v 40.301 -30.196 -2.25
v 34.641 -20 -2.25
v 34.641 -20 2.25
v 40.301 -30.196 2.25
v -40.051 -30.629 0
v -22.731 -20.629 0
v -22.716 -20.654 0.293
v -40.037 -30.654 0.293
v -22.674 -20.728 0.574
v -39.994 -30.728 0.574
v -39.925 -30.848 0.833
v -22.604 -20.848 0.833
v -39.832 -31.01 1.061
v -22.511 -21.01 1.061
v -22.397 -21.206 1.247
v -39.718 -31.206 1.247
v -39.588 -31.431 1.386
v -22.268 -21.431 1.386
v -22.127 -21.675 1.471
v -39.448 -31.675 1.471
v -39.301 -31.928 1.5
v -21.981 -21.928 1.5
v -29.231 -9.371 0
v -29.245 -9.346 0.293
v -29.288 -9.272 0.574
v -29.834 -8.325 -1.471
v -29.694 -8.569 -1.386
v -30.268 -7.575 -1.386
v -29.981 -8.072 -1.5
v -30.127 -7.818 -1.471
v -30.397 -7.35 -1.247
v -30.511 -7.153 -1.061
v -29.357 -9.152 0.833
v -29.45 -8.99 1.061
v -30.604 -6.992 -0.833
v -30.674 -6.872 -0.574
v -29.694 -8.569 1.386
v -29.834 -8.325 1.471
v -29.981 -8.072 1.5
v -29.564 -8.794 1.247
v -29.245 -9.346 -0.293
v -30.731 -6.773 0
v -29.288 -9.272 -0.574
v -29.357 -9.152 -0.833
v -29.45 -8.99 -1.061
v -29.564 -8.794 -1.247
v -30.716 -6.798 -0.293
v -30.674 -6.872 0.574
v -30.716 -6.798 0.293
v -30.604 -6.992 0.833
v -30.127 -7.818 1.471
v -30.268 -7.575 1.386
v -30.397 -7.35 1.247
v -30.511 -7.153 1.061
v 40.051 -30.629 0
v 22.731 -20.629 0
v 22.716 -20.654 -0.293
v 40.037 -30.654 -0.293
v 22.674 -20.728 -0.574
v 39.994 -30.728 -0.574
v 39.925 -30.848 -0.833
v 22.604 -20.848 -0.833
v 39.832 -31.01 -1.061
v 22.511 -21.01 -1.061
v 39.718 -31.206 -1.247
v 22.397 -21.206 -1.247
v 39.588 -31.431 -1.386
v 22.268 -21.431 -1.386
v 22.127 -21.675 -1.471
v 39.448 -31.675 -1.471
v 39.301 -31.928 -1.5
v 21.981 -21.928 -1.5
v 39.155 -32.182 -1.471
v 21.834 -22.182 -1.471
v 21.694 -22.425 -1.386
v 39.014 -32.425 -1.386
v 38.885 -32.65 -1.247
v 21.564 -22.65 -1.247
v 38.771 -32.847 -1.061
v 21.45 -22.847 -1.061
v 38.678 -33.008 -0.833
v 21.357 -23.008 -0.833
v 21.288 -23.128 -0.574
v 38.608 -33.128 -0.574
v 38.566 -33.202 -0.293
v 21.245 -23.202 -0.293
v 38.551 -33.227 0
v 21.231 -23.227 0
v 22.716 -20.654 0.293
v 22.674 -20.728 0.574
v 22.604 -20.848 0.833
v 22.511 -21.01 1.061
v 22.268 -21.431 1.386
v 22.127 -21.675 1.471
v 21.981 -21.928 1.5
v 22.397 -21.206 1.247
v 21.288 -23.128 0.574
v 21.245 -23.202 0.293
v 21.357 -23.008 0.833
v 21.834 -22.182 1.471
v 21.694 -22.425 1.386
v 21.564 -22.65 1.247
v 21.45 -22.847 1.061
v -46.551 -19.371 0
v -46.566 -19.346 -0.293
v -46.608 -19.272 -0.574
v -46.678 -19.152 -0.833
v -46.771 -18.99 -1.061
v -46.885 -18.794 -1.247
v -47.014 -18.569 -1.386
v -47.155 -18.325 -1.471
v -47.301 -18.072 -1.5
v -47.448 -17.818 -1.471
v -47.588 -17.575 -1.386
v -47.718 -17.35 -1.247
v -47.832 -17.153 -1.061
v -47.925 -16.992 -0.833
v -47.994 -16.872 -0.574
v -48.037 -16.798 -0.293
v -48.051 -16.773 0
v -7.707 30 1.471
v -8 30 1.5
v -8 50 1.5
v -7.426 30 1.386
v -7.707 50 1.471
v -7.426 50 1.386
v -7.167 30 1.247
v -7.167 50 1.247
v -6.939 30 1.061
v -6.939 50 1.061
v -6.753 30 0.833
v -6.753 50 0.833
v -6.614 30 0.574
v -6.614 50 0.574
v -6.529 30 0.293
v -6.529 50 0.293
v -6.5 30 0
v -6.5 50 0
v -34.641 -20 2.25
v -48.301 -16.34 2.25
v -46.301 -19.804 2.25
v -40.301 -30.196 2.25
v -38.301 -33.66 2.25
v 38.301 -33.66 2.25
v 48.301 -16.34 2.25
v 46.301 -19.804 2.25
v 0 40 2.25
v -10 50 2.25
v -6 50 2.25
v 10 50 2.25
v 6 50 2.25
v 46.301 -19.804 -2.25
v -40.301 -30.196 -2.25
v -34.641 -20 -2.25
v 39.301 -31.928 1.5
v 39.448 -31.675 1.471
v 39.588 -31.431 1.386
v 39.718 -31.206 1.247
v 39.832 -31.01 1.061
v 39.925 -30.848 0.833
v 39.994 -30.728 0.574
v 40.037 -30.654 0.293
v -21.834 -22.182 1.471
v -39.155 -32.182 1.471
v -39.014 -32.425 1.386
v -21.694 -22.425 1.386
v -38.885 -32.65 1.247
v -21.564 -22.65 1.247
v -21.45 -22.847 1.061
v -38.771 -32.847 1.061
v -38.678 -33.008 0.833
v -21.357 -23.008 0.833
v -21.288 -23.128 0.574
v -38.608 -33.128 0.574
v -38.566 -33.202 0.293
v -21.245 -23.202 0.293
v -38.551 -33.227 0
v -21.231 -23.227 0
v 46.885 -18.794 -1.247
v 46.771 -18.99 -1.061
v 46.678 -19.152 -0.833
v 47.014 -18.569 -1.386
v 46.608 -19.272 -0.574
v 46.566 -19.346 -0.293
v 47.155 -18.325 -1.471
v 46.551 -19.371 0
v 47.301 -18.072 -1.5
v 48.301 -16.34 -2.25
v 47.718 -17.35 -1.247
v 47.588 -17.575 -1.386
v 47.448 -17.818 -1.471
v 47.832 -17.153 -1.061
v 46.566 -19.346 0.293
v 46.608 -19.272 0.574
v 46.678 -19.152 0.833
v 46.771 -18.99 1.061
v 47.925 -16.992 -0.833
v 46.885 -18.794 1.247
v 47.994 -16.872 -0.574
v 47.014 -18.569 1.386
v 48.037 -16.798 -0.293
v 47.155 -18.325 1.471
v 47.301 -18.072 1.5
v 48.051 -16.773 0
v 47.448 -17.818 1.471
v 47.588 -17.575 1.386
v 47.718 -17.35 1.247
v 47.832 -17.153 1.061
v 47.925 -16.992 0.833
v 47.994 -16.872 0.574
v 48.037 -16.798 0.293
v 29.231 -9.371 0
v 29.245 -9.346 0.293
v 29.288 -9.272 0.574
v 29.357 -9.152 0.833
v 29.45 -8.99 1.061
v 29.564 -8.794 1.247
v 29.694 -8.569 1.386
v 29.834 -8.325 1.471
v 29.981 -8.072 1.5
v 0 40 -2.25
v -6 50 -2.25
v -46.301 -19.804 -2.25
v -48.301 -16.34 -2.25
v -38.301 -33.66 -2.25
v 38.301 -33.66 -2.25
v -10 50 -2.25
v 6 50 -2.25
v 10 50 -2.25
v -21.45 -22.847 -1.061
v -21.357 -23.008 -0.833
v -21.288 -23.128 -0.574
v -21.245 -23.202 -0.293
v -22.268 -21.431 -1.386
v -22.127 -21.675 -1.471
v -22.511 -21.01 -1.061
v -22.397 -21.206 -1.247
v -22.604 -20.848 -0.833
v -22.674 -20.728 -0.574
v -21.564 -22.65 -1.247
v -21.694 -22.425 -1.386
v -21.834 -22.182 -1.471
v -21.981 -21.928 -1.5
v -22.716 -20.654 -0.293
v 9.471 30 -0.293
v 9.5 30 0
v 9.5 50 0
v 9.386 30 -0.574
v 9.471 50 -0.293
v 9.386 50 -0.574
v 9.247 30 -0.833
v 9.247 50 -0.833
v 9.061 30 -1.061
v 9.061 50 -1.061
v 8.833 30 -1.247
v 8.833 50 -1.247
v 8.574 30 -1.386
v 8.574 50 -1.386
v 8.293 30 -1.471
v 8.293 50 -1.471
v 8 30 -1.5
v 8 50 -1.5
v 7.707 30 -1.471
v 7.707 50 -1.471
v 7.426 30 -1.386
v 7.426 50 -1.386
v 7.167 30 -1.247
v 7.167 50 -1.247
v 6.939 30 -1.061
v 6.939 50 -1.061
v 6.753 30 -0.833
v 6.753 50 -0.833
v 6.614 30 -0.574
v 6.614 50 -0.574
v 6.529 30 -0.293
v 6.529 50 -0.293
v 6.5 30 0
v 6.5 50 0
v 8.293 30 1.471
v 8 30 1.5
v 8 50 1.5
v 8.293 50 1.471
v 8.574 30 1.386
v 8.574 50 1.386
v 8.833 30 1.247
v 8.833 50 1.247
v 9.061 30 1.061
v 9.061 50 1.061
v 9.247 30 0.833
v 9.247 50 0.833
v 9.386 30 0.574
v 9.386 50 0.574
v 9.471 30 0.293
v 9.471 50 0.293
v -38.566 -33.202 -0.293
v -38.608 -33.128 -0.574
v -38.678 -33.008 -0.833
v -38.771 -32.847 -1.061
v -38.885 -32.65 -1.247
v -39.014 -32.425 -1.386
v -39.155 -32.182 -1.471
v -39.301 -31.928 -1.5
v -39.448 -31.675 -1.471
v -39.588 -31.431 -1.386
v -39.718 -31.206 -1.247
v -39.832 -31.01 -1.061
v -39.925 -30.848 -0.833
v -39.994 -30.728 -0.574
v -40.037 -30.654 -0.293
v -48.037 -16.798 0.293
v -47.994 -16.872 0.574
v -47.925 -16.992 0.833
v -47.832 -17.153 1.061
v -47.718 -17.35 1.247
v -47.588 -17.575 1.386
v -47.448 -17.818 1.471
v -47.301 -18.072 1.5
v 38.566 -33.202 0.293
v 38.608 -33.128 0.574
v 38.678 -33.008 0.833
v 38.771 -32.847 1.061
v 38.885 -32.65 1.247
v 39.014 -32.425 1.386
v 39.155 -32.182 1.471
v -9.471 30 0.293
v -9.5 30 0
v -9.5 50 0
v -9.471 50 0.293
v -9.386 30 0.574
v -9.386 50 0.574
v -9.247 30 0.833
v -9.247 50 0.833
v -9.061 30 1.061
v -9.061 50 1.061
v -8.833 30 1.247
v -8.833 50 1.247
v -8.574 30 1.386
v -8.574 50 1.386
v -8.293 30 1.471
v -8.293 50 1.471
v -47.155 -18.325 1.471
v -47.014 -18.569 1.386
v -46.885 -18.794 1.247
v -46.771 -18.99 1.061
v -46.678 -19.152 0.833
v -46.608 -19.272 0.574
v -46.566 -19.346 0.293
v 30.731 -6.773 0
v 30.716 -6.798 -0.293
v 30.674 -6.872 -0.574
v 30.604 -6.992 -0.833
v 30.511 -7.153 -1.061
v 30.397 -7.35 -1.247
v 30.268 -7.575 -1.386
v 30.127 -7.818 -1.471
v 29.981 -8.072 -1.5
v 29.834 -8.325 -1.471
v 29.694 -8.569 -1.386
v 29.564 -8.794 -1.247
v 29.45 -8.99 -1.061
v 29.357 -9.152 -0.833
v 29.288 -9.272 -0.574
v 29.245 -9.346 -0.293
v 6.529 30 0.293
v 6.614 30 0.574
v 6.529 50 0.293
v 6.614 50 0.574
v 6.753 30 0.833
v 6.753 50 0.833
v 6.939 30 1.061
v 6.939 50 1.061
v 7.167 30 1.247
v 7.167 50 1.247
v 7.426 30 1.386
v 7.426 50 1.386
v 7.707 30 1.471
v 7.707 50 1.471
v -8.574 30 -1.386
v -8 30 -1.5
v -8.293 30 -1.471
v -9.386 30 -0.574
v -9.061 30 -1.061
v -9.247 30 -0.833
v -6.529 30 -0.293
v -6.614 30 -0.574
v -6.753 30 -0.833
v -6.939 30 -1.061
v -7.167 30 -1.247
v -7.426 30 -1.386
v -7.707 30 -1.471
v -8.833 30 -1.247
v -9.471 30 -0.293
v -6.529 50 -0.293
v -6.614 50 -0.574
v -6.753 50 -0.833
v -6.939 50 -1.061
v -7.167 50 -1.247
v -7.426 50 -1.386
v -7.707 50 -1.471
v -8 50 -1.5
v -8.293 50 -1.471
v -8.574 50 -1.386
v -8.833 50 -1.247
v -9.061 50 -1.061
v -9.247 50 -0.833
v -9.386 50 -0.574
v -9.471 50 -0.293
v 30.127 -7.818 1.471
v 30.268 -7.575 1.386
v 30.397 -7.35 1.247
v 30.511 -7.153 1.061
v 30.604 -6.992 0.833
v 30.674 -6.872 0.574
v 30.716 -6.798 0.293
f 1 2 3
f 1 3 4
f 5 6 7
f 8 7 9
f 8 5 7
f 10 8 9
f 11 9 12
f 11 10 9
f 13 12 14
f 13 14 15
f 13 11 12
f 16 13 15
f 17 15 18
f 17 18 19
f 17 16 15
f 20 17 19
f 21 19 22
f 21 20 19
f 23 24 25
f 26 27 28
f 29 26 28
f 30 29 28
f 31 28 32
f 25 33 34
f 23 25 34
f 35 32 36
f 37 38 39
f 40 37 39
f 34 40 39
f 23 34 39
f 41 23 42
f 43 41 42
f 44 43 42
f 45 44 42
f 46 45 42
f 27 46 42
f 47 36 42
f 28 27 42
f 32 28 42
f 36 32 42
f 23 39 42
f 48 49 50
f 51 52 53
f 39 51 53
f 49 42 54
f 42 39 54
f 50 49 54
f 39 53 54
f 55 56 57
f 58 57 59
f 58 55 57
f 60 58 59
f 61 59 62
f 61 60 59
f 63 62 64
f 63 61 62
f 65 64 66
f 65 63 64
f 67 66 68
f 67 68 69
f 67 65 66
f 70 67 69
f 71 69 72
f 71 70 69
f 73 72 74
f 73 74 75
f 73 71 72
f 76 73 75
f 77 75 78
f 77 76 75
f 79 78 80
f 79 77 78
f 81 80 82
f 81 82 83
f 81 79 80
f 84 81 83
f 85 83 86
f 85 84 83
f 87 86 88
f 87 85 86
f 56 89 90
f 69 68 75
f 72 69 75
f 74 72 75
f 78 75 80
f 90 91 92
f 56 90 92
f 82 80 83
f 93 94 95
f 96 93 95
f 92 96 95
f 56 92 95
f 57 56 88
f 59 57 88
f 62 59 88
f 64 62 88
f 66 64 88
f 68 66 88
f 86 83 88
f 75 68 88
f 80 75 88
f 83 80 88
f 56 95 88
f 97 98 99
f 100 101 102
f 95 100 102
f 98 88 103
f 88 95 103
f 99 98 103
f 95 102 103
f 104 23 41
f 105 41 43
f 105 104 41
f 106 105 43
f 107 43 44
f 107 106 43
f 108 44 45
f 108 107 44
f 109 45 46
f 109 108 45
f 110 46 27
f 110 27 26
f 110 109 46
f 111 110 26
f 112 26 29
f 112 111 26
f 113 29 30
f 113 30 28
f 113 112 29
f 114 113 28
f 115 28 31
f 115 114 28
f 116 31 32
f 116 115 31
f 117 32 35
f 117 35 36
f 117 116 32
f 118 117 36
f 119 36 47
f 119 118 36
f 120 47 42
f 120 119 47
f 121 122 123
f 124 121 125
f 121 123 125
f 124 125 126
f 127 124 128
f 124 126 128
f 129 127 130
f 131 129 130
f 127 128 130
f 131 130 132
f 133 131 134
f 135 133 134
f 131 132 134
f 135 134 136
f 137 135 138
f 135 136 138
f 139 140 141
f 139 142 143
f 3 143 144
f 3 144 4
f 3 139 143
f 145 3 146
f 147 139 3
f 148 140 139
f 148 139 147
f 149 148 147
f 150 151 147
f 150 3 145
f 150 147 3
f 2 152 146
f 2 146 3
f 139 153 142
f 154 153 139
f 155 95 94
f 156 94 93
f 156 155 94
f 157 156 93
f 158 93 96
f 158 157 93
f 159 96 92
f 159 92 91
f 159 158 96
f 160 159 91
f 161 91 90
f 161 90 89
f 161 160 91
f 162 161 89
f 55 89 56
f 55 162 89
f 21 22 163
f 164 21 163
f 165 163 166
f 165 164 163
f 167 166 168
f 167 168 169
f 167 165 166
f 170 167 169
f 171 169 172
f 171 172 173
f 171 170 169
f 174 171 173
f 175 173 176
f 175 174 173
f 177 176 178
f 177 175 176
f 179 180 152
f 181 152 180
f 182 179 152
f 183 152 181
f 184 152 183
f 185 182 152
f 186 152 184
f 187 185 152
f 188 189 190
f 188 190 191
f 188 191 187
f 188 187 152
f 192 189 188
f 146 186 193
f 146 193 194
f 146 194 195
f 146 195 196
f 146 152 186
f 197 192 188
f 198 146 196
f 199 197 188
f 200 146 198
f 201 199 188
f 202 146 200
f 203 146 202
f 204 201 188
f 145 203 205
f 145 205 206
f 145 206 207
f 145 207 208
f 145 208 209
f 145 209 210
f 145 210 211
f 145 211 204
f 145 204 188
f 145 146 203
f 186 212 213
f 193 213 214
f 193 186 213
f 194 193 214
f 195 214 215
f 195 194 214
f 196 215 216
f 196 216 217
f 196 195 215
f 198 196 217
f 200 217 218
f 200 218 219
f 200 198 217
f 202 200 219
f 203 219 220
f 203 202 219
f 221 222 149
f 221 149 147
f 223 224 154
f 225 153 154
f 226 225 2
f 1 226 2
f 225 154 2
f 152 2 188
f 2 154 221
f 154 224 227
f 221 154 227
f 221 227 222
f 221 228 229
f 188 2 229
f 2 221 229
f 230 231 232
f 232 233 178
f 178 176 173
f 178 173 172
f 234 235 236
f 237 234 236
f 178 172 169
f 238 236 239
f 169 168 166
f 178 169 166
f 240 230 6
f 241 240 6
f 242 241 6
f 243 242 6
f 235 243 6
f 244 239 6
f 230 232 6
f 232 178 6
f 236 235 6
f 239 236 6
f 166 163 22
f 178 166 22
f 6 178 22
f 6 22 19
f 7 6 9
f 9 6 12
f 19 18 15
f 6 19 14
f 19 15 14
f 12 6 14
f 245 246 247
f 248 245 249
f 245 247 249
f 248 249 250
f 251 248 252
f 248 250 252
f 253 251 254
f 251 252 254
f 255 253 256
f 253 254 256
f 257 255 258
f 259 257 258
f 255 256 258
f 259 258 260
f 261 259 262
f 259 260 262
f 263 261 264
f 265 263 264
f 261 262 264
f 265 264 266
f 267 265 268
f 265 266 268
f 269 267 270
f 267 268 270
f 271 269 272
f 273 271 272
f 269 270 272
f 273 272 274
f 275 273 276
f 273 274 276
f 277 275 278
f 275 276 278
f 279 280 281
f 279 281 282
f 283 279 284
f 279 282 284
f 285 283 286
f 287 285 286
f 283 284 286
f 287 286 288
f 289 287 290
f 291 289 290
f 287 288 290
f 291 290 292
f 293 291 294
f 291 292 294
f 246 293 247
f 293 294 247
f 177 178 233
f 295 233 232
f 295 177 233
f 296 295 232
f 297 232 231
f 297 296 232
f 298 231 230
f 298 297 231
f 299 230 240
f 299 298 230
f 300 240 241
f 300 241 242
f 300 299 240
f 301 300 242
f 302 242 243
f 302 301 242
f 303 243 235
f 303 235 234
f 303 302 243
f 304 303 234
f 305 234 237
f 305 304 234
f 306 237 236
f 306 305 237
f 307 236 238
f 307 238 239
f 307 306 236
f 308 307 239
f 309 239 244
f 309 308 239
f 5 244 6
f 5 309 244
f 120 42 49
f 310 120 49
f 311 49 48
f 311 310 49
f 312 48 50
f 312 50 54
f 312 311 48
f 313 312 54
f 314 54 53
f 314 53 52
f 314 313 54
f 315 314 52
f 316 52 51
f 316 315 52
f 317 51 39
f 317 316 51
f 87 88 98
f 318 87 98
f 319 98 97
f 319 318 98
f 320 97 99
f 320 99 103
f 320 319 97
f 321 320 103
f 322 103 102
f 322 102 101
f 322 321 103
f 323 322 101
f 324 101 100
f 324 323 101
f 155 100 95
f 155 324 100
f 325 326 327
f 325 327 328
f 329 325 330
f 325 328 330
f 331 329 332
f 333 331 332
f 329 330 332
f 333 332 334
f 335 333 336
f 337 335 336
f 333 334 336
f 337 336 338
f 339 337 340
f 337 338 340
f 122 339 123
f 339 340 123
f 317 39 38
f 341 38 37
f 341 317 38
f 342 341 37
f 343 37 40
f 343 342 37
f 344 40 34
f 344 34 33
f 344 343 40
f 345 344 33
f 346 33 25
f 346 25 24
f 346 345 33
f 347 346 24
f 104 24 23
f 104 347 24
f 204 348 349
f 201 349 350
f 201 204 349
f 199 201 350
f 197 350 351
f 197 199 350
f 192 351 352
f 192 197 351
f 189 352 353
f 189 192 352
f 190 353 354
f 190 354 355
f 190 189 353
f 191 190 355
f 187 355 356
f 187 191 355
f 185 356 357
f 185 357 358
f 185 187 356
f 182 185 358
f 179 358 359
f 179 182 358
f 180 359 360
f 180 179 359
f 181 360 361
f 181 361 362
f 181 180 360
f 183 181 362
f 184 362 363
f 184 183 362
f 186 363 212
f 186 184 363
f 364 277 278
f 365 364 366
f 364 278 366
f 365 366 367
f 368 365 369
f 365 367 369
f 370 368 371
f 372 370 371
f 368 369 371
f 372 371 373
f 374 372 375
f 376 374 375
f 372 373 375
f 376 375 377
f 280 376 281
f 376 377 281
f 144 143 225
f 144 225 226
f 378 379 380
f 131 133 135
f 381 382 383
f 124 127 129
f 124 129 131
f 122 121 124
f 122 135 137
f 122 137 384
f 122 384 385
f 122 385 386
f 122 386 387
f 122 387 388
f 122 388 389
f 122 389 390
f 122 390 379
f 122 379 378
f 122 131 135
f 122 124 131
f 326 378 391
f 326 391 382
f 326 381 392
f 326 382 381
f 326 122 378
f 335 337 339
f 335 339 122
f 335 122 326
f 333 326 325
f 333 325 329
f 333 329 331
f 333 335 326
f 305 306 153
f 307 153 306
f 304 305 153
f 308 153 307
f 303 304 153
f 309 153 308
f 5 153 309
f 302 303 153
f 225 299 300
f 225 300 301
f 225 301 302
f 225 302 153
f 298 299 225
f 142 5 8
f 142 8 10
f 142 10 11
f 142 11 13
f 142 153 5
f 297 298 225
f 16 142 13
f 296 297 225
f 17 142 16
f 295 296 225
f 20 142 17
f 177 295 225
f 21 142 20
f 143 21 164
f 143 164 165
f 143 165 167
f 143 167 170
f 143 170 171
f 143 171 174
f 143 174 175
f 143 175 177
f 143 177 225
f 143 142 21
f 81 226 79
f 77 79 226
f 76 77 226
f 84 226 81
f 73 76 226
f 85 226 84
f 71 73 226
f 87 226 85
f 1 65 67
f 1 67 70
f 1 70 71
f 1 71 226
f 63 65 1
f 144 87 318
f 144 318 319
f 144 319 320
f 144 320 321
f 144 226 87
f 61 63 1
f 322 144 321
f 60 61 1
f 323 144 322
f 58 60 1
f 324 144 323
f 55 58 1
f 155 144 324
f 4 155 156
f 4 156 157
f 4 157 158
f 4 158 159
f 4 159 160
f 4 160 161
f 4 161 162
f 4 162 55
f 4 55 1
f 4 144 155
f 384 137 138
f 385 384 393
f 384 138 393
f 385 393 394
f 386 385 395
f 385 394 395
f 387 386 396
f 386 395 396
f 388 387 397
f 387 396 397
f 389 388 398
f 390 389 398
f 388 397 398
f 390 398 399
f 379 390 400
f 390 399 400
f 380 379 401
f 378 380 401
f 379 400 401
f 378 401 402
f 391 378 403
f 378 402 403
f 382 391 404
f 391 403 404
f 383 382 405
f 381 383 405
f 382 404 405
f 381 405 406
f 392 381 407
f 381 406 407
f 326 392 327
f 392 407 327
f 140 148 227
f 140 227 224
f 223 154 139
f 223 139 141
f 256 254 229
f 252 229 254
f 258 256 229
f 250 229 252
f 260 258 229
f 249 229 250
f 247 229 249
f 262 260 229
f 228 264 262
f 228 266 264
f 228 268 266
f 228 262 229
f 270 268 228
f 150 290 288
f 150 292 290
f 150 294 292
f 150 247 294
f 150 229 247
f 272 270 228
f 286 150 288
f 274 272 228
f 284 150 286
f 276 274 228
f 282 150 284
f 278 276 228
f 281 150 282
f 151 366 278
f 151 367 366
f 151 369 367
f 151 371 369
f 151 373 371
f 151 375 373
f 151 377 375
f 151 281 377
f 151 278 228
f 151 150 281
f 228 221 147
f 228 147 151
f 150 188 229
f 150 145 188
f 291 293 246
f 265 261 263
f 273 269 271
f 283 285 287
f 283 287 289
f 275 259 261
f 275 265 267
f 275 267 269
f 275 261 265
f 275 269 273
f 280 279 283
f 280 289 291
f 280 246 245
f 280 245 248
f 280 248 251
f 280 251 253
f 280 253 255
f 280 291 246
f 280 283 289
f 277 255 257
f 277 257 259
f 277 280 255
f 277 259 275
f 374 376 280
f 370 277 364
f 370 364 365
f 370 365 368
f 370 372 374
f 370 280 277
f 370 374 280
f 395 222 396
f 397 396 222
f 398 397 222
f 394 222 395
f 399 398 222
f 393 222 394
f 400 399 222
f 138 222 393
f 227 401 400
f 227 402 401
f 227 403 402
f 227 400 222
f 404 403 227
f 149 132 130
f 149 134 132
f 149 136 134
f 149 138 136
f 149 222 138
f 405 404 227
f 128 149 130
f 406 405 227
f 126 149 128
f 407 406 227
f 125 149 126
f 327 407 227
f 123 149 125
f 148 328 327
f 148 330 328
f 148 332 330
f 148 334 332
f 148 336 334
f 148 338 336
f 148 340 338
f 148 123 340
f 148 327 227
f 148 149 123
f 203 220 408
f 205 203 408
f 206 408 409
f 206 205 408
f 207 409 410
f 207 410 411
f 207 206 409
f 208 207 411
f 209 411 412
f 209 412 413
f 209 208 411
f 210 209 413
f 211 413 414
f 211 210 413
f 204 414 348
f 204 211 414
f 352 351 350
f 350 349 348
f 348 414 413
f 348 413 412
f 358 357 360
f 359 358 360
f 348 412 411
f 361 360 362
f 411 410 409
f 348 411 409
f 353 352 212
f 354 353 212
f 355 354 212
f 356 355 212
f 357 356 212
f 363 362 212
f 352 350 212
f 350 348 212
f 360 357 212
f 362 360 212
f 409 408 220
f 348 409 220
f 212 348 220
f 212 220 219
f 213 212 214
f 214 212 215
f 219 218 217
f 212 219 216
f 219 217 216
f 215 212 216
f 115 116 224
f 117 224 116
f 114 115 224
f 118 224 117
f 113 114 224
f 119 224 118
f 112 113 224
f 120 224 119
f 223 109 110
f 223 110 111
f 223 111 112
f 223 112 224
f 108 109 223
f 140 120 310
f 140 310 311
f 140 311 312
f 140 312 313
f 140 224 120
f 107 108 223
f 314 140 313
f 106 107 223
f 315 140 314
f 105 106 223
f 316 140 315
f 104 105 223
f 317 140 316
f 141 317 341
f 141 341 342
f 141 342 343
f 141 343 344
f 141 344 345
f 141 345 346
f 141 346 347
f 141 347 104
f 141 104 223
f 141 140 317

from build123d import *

# Parameters (mm, degrees)
F1_DEPTH       = 2.25
F1_DEPTH_BACK  = 2.25
F3_DEPTH       = 20
F10_DEPTH      = 2.251
F10_DEPTH_BACK = 25


# Not quite as in the source:
# - a feature names something its author has since deleted; it is built from what else it names


with BuildPart() as f1:
    # F0 (on Top) → F1 (new body, two sides)
    with BuildSketch(Plane.XY) as f1_sk:
        Polygon((10, 50), (0, 50), (21.6506350946, 12.5), (29.1506350946, 16.8301270189), align=None)
        Polygon((-21.6506350946, 12.5), (0, 50), (-10, 50), (-29.1506350946, 16.8301270189), align=None)
        Polygon((21.6506350946, 12.5), (0, 50), (0, 0), align=None)
        Polygon((0, 0), (0, 50), (-21.6506350946, 12.5), align=None)
        Polygon((29.1506350946, 16.8301270189), (21.6506350946, 12.5), (43.3012701892, -25), (48.3012701892, -16.3397459622), align=None)
        Polygon((43.3012701892, -25), (21.6506350946, 12.5), (0, 0), align=None)
        Polygon((43.3012701892, -25), (0, 0), (-43.3012701892, -25), align=None)
        Polygon((-43.3012701892, -25), (0, 0), (-21.6506350946, 12.5), align=None)
        Polygon((-43.3012701892, -25), (-21.6506350946, 12.5), (-29.1506350946, 16.8301270189), (-48.3012701892, -16.3397459622), align=None)
        Polygon((38.3012701892, -33.6602540378), (43.3012701892, -25), (-43.3012701892, -25), (-38.3012701892, -33.6602540378), align=None)
    extrude(amount=F1_DEPTH)
    extrude(f1_sk.sketch, amount=-F1_DEPTH_BACK)


with BuildPart() as f3:
    # F2 (on face) → F3 (new body)
    with BuildSketch(Plane(origin=(0, 50, 0), x_dir=(-1, 0, 0), z_dir=(0, 1, 0))):
        with BuildLine():
            Line((-8, 0), (-6.5, 0))
            ThreePointArc((-6.5, 0), (-6.9393398282, 1.0606601718), (-8, 1.5))
            Line((-8, 1.5), (-8, 0))
        make_face()
        with BuildLine():
            ThreePointArc((-9.5, 0), (-8, -1.5), (-6.5, 0))
            Line((-6.5, 0), (-8, 0))
            Line((-8, 0), (-9.5, 0))
        make_face()
        with BuildLine():
            Line((-8, 0), (-8, 1.5))
            ThreePointArc((-8, 1.5), (-9.0606601718, 1.0606601718), (-9.5, 0))
            Line((-9.5, 0), (-8, 0))
        make_face()
    extrude(amount=-F3_DEPTH)


with BuildPart() as f3b:
    # F2 (on face) → F3, piece 2 (new body)
    with BuildSketch(Plane(origin=(0, 50, 0), x_dir=(-1, 0, 0), z_dir=(0, 1, 0))):
        with BuildLine():
            ThreePointArc((8, 1.5), (6.9393398282, 1.0606601718), (6.5, 0))
            Line((6.5, 0), (8, 0))
            Line((8, 0), (8, 1.5))
        make_face()
        with BuildLine():
            Line((8, 0), (6.5, 0))
            ThreePointArc((6.5, 0), (8, -1.5), (9.5, 0))
            Line((9.5, 0), (8, 0))
        make_face()
        with BuildLine():
            ThreePointArc((9.5, 0), (9.0606601718, 1.0606601718), (8, 1.5))
            Line((8, 1.5), (8, 0))
            Line((8, 0), (9.5, 0))
        make_face()
    extrude(amount=-F3_DEPTH)


with BuildPart() as f6_1:
    # F6: instance of F3
    add(f3.part.mirror(Plane(origin=(0, 0, 0), x_dir=(0.8660254038, 0.5, 0), z_dir=(0.5, -0.8660254038, 0))))


with BuildPart() as f6_2:
    # F6: instance of F3b
    add(f3b.part.mirror(Plane(origin=(0, 0, 0), x_dir=(0.8660254038, 0.5, 0), z_dir=(0.5, -0.8660254038, 0))))


with BuildPart() as f7_1:
    # F7: instance of F3
    add(f3.part.mirror(Plane(origin=(0, 0, 0), x_dir=(0.8660254038, -0.5, 0), z_dir=(-0.5, -0.8660254038, 0))))


with BuildPart() as f7_2:
    # F7: instance of F3b
    add(f3b.part.mirror(Plane(origin=(0, 0, 0), x_dir=(0.8660254038, -0.5, 0), z_dir=(-0.5, -0.8660254038, 0))))


with BuildPart() as f1_1:
    add(f1.part)

    # F8: cut F3, F3b, F6_1, F6_2, F7_2, F7_1
    add(f3.part, mode=Mode.SUBTRACT)
    add(f3b.part, mode=Mode.SUBTRACT)
    add(f6_1.part, mode=Mode.SUBTRACT)
    add(f6_2.part, mode=Mode.SUBTRACT)
    add(f7_2.part, mode=Mode.SUBTRACT)
    add(f7_1.part, mode=Mode.SUBTRACT)

    # F9 (on Top) → F10 (cut, two sides)
    with BuildSketch(Plane.XY) as f10_sk:
        Polygon((0, 50), (-6, 50), (0, 40), align=None)
        Polygon((0, 50), (0, 40), (6, 50), align=None)
        Polygon((-40.3012701892, -30.1961524227), (-34.6410161514, -20), (-43.3012701892, -25), align=None)
        Polygon((-43.3012701892, -25), (-34.6410161514, -20), (-46.3012701892, -19.8038475773), align=None)
        Polygon((34.6410161514, -20), (43.3012701892, -25), (46.3012701892, -19.8038475773), align=None)
        Polygon((40.3012701892, -30.1961524227), (43.3012701892, -25), (34.6410161514, -20), align=None)
    extrude(amount=-F10_DEPTH, mode=Mode.SUBTRACT)
    extrude(f10_sk.sketch, amount=F10_DEPTH_BACK, mode=Mode.SUBTRACT)


solid = f1_1.part
